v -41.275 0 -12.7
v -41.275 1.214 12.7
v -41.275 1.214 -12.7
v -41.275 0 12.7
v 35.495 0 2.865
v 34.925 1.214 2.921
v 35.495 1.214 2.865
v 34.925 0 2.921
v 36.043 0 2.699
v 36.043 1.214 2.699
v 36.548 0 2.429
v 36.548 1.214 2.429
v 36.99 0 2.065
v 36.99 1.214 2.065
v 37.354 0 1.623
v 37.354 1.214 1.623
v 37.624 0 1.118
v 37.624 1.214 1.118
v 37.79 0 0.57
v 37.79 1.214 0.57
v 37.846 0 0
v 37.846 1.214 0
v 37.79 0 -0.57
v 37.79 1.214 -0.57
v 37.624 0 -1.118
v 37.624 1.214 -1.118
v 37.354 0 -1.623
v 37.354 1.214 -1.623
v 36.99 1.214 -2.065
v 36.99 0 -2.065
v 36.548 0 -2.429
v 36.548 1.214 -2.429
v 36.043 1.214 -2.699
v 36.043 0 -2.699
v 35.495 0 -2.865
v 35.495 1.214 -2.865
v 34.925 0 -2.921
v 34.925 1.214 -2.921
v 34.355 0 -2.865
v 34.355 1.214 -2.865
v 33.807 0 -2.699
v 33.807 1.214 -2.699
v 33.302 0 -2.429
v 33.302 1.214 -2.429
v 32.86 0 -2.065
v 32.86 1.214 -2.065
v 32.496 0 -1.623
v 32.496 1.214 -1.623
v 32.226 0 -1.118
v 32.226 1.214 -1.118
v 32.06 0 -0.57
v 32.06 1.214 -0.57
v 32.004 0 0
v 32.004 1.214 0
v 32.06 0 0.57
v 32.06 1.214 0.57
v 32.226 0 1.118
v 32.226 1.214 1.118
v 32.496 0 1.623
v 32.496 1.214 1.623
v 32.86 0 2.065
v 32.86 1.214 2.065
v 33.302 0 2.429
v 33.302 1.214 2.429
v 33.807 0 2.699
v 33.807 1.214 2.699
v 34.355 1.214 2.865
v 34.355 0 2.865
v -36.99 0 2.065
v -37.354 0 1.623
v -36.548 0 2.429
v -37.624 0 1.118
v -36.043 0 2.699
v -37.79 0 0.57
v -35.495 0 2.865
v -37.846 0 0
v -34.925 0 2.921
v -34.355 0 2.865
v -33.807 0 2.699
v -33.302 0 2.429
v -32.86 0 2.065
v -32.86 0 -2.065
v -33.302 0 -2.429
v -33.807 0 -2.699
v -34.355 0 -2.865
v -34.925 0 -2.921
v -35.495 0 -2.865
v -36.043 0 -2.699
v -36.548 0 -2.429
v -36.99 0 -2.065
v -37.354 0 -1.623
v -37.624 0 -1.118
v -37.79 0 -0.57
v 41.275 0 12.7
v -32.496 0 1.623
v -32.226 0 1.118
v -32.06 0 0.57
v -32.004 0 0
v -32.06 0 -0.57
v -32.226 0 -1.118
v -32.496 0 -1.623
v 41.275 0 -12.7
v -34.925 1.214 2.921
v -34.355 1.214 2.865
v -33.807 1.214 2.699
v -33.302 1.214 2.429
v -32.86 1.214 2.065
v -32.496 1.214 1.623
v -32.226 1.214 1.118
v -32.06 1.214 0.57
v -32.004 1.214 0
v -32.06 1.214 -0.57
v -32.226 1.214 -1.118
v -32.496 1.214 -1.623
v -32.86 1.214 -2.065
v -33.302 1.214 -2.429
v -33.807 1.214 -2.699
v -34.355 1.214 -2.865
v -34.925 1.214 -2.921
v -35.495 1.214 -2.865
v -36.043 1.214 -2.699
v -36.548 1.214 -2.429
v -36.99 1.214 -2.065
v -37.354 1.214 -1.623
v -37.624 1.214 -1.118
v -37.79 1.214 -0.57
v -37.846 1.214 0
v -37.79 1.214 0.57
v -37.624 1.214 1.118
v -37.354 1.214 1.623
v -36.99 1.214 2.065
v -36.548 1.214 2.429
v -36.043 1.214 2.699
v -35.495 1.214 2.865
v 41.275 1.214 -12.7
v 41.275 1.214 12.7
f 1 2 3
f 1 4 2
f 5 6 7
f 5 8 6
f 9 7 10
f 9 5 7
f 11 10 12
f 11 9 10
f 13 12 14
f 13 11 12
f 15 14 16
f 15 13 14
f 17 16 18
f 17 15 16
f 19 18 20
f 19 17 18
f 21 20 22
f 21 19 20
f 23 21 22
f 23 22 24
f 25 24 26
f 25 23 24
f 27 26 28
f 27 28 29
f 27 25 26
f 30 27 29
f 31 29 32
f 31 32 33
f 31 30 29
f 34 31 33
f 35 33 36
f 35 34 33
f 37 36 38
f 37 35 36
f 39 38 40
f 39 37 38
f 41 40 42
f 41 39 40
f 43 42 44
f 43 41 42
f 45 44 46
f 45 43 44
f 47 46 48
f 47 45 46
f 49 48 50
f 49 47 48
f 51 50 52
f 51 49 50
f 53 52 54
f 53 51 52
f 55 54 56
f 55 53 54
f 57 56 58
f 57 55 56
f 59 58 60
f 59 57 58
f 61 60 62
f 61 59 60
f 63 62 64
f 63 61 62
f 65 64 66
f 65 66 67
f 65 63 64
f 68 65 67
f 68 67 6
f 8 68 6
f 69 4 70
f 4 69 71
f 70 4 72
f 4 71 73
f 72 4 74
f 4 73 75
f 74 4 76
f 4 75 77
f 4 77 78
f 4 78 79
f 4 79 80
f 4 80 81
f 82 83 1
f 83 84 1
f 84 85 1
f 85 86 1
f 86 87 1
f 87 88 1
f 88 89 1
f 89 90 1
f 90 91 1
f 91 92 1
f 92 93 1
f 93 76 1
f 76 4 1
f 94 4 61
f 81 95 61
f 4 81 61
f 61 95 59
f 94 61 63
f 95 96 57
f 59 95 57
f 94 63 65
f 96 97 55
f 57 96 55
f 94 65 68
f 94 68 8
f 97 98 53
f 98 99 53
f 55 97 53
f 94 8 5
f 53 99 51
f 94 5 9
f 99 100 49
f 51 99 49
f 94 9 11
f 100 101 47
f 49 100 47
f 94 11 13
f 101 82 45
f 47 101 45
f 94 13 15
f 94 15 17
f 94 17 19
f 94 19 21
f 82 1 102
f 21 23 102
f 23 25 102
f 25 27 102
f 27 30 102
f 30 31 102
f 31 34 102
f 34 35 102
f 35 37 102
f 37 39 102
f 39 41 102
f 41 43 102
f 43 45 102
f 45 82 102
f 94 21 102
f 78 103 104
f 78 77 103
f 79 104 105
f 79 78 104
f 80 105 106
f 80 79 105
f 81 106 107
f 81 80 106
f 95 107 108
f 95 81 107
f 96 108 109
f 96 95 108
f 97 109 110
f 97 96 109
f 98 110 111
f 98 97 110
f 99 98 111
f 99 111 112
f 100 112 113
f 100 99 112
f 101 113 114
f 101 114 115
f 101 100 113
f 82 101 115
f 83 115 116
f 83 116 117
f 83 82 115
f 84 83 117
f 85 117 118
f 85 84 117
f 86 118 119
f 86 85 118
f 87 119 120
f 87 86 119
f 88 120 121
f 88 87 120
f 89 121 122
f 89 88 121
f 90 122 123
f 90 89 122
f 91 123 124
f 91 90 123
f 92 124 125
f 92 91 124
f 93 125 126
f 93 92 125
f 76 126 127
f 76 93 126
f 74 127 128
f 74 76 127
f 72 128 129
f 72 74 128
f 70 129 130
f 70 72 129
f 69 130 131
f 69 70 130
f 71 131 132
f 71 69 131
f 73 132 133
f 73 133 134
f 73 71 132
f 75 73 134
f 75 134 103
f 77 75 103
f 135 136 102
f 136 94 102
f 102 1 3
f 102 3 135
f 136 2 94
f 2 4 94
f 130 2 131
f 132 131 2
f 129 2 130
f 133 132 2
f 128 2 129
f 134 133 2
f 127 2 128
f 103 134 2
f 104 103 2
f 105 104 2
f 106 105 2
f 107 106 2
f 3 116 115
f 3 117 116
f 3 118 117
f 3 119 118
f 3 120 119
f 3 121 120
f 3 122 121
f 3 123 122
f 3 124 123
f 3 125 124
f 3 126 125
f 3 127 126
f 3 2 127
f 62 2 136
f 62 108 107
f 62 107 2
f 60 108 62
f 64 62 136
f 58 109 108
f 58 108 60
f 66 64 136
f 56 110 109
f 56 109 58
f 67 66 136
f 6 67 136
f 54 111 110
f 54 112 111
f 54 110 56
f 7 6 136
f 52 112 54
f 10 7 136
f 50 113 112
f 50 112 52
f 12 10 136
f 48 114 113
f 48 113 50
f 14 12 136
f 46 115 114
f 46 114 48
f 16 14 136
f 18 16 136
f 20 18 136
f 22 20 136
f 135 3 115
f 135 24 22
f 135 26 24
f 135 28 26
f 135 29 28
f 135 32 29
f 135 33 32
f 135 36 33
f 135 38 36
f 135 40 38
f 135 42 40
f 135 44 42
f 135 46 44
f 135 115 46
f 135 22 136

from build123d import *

# Parameters (mm, degrees)
SKETCH1_W           = 82.55
SKETCH1_H           = 25.4
SKETCH1_R           = 2.921
BOSS_EXTRUDE1_DEPTH = 1.1176
MOVE_FACE2_BY       = 0.09652


with BuildPart() as part:
    # Sketch1 → Boss-Extrude1 (new body)
    with BuildSketch(Plane(origin=(0, 0, 0), x_dir=(1, 0, 0), z_dir=(0, 1, 0))):
        Rectangle(SKETCH1_W, SKETCH1_H)
        with Locations(Location((-34.925, 0, 0), (0, 0, 270))):
            Circle(SKETCH1_R, mode=Mode.SUBTRACT)
        with Locations(Location((34.925, 0, 0), (0, 0, 270))):
            Circle(SKETCH1_R, mode=Mode.SUBTRACT)
    extrude(amount=BOSS_EXTRUDE1_DEPTH)

    # Move Face2: a face moved outward by 0.09652
    extrude(part.faces().sort_by_distance((0, 1.1176, 0))[0], amount=MOVE_FACE2_BY, dir=(0, 1, 0))


solid = part.part
